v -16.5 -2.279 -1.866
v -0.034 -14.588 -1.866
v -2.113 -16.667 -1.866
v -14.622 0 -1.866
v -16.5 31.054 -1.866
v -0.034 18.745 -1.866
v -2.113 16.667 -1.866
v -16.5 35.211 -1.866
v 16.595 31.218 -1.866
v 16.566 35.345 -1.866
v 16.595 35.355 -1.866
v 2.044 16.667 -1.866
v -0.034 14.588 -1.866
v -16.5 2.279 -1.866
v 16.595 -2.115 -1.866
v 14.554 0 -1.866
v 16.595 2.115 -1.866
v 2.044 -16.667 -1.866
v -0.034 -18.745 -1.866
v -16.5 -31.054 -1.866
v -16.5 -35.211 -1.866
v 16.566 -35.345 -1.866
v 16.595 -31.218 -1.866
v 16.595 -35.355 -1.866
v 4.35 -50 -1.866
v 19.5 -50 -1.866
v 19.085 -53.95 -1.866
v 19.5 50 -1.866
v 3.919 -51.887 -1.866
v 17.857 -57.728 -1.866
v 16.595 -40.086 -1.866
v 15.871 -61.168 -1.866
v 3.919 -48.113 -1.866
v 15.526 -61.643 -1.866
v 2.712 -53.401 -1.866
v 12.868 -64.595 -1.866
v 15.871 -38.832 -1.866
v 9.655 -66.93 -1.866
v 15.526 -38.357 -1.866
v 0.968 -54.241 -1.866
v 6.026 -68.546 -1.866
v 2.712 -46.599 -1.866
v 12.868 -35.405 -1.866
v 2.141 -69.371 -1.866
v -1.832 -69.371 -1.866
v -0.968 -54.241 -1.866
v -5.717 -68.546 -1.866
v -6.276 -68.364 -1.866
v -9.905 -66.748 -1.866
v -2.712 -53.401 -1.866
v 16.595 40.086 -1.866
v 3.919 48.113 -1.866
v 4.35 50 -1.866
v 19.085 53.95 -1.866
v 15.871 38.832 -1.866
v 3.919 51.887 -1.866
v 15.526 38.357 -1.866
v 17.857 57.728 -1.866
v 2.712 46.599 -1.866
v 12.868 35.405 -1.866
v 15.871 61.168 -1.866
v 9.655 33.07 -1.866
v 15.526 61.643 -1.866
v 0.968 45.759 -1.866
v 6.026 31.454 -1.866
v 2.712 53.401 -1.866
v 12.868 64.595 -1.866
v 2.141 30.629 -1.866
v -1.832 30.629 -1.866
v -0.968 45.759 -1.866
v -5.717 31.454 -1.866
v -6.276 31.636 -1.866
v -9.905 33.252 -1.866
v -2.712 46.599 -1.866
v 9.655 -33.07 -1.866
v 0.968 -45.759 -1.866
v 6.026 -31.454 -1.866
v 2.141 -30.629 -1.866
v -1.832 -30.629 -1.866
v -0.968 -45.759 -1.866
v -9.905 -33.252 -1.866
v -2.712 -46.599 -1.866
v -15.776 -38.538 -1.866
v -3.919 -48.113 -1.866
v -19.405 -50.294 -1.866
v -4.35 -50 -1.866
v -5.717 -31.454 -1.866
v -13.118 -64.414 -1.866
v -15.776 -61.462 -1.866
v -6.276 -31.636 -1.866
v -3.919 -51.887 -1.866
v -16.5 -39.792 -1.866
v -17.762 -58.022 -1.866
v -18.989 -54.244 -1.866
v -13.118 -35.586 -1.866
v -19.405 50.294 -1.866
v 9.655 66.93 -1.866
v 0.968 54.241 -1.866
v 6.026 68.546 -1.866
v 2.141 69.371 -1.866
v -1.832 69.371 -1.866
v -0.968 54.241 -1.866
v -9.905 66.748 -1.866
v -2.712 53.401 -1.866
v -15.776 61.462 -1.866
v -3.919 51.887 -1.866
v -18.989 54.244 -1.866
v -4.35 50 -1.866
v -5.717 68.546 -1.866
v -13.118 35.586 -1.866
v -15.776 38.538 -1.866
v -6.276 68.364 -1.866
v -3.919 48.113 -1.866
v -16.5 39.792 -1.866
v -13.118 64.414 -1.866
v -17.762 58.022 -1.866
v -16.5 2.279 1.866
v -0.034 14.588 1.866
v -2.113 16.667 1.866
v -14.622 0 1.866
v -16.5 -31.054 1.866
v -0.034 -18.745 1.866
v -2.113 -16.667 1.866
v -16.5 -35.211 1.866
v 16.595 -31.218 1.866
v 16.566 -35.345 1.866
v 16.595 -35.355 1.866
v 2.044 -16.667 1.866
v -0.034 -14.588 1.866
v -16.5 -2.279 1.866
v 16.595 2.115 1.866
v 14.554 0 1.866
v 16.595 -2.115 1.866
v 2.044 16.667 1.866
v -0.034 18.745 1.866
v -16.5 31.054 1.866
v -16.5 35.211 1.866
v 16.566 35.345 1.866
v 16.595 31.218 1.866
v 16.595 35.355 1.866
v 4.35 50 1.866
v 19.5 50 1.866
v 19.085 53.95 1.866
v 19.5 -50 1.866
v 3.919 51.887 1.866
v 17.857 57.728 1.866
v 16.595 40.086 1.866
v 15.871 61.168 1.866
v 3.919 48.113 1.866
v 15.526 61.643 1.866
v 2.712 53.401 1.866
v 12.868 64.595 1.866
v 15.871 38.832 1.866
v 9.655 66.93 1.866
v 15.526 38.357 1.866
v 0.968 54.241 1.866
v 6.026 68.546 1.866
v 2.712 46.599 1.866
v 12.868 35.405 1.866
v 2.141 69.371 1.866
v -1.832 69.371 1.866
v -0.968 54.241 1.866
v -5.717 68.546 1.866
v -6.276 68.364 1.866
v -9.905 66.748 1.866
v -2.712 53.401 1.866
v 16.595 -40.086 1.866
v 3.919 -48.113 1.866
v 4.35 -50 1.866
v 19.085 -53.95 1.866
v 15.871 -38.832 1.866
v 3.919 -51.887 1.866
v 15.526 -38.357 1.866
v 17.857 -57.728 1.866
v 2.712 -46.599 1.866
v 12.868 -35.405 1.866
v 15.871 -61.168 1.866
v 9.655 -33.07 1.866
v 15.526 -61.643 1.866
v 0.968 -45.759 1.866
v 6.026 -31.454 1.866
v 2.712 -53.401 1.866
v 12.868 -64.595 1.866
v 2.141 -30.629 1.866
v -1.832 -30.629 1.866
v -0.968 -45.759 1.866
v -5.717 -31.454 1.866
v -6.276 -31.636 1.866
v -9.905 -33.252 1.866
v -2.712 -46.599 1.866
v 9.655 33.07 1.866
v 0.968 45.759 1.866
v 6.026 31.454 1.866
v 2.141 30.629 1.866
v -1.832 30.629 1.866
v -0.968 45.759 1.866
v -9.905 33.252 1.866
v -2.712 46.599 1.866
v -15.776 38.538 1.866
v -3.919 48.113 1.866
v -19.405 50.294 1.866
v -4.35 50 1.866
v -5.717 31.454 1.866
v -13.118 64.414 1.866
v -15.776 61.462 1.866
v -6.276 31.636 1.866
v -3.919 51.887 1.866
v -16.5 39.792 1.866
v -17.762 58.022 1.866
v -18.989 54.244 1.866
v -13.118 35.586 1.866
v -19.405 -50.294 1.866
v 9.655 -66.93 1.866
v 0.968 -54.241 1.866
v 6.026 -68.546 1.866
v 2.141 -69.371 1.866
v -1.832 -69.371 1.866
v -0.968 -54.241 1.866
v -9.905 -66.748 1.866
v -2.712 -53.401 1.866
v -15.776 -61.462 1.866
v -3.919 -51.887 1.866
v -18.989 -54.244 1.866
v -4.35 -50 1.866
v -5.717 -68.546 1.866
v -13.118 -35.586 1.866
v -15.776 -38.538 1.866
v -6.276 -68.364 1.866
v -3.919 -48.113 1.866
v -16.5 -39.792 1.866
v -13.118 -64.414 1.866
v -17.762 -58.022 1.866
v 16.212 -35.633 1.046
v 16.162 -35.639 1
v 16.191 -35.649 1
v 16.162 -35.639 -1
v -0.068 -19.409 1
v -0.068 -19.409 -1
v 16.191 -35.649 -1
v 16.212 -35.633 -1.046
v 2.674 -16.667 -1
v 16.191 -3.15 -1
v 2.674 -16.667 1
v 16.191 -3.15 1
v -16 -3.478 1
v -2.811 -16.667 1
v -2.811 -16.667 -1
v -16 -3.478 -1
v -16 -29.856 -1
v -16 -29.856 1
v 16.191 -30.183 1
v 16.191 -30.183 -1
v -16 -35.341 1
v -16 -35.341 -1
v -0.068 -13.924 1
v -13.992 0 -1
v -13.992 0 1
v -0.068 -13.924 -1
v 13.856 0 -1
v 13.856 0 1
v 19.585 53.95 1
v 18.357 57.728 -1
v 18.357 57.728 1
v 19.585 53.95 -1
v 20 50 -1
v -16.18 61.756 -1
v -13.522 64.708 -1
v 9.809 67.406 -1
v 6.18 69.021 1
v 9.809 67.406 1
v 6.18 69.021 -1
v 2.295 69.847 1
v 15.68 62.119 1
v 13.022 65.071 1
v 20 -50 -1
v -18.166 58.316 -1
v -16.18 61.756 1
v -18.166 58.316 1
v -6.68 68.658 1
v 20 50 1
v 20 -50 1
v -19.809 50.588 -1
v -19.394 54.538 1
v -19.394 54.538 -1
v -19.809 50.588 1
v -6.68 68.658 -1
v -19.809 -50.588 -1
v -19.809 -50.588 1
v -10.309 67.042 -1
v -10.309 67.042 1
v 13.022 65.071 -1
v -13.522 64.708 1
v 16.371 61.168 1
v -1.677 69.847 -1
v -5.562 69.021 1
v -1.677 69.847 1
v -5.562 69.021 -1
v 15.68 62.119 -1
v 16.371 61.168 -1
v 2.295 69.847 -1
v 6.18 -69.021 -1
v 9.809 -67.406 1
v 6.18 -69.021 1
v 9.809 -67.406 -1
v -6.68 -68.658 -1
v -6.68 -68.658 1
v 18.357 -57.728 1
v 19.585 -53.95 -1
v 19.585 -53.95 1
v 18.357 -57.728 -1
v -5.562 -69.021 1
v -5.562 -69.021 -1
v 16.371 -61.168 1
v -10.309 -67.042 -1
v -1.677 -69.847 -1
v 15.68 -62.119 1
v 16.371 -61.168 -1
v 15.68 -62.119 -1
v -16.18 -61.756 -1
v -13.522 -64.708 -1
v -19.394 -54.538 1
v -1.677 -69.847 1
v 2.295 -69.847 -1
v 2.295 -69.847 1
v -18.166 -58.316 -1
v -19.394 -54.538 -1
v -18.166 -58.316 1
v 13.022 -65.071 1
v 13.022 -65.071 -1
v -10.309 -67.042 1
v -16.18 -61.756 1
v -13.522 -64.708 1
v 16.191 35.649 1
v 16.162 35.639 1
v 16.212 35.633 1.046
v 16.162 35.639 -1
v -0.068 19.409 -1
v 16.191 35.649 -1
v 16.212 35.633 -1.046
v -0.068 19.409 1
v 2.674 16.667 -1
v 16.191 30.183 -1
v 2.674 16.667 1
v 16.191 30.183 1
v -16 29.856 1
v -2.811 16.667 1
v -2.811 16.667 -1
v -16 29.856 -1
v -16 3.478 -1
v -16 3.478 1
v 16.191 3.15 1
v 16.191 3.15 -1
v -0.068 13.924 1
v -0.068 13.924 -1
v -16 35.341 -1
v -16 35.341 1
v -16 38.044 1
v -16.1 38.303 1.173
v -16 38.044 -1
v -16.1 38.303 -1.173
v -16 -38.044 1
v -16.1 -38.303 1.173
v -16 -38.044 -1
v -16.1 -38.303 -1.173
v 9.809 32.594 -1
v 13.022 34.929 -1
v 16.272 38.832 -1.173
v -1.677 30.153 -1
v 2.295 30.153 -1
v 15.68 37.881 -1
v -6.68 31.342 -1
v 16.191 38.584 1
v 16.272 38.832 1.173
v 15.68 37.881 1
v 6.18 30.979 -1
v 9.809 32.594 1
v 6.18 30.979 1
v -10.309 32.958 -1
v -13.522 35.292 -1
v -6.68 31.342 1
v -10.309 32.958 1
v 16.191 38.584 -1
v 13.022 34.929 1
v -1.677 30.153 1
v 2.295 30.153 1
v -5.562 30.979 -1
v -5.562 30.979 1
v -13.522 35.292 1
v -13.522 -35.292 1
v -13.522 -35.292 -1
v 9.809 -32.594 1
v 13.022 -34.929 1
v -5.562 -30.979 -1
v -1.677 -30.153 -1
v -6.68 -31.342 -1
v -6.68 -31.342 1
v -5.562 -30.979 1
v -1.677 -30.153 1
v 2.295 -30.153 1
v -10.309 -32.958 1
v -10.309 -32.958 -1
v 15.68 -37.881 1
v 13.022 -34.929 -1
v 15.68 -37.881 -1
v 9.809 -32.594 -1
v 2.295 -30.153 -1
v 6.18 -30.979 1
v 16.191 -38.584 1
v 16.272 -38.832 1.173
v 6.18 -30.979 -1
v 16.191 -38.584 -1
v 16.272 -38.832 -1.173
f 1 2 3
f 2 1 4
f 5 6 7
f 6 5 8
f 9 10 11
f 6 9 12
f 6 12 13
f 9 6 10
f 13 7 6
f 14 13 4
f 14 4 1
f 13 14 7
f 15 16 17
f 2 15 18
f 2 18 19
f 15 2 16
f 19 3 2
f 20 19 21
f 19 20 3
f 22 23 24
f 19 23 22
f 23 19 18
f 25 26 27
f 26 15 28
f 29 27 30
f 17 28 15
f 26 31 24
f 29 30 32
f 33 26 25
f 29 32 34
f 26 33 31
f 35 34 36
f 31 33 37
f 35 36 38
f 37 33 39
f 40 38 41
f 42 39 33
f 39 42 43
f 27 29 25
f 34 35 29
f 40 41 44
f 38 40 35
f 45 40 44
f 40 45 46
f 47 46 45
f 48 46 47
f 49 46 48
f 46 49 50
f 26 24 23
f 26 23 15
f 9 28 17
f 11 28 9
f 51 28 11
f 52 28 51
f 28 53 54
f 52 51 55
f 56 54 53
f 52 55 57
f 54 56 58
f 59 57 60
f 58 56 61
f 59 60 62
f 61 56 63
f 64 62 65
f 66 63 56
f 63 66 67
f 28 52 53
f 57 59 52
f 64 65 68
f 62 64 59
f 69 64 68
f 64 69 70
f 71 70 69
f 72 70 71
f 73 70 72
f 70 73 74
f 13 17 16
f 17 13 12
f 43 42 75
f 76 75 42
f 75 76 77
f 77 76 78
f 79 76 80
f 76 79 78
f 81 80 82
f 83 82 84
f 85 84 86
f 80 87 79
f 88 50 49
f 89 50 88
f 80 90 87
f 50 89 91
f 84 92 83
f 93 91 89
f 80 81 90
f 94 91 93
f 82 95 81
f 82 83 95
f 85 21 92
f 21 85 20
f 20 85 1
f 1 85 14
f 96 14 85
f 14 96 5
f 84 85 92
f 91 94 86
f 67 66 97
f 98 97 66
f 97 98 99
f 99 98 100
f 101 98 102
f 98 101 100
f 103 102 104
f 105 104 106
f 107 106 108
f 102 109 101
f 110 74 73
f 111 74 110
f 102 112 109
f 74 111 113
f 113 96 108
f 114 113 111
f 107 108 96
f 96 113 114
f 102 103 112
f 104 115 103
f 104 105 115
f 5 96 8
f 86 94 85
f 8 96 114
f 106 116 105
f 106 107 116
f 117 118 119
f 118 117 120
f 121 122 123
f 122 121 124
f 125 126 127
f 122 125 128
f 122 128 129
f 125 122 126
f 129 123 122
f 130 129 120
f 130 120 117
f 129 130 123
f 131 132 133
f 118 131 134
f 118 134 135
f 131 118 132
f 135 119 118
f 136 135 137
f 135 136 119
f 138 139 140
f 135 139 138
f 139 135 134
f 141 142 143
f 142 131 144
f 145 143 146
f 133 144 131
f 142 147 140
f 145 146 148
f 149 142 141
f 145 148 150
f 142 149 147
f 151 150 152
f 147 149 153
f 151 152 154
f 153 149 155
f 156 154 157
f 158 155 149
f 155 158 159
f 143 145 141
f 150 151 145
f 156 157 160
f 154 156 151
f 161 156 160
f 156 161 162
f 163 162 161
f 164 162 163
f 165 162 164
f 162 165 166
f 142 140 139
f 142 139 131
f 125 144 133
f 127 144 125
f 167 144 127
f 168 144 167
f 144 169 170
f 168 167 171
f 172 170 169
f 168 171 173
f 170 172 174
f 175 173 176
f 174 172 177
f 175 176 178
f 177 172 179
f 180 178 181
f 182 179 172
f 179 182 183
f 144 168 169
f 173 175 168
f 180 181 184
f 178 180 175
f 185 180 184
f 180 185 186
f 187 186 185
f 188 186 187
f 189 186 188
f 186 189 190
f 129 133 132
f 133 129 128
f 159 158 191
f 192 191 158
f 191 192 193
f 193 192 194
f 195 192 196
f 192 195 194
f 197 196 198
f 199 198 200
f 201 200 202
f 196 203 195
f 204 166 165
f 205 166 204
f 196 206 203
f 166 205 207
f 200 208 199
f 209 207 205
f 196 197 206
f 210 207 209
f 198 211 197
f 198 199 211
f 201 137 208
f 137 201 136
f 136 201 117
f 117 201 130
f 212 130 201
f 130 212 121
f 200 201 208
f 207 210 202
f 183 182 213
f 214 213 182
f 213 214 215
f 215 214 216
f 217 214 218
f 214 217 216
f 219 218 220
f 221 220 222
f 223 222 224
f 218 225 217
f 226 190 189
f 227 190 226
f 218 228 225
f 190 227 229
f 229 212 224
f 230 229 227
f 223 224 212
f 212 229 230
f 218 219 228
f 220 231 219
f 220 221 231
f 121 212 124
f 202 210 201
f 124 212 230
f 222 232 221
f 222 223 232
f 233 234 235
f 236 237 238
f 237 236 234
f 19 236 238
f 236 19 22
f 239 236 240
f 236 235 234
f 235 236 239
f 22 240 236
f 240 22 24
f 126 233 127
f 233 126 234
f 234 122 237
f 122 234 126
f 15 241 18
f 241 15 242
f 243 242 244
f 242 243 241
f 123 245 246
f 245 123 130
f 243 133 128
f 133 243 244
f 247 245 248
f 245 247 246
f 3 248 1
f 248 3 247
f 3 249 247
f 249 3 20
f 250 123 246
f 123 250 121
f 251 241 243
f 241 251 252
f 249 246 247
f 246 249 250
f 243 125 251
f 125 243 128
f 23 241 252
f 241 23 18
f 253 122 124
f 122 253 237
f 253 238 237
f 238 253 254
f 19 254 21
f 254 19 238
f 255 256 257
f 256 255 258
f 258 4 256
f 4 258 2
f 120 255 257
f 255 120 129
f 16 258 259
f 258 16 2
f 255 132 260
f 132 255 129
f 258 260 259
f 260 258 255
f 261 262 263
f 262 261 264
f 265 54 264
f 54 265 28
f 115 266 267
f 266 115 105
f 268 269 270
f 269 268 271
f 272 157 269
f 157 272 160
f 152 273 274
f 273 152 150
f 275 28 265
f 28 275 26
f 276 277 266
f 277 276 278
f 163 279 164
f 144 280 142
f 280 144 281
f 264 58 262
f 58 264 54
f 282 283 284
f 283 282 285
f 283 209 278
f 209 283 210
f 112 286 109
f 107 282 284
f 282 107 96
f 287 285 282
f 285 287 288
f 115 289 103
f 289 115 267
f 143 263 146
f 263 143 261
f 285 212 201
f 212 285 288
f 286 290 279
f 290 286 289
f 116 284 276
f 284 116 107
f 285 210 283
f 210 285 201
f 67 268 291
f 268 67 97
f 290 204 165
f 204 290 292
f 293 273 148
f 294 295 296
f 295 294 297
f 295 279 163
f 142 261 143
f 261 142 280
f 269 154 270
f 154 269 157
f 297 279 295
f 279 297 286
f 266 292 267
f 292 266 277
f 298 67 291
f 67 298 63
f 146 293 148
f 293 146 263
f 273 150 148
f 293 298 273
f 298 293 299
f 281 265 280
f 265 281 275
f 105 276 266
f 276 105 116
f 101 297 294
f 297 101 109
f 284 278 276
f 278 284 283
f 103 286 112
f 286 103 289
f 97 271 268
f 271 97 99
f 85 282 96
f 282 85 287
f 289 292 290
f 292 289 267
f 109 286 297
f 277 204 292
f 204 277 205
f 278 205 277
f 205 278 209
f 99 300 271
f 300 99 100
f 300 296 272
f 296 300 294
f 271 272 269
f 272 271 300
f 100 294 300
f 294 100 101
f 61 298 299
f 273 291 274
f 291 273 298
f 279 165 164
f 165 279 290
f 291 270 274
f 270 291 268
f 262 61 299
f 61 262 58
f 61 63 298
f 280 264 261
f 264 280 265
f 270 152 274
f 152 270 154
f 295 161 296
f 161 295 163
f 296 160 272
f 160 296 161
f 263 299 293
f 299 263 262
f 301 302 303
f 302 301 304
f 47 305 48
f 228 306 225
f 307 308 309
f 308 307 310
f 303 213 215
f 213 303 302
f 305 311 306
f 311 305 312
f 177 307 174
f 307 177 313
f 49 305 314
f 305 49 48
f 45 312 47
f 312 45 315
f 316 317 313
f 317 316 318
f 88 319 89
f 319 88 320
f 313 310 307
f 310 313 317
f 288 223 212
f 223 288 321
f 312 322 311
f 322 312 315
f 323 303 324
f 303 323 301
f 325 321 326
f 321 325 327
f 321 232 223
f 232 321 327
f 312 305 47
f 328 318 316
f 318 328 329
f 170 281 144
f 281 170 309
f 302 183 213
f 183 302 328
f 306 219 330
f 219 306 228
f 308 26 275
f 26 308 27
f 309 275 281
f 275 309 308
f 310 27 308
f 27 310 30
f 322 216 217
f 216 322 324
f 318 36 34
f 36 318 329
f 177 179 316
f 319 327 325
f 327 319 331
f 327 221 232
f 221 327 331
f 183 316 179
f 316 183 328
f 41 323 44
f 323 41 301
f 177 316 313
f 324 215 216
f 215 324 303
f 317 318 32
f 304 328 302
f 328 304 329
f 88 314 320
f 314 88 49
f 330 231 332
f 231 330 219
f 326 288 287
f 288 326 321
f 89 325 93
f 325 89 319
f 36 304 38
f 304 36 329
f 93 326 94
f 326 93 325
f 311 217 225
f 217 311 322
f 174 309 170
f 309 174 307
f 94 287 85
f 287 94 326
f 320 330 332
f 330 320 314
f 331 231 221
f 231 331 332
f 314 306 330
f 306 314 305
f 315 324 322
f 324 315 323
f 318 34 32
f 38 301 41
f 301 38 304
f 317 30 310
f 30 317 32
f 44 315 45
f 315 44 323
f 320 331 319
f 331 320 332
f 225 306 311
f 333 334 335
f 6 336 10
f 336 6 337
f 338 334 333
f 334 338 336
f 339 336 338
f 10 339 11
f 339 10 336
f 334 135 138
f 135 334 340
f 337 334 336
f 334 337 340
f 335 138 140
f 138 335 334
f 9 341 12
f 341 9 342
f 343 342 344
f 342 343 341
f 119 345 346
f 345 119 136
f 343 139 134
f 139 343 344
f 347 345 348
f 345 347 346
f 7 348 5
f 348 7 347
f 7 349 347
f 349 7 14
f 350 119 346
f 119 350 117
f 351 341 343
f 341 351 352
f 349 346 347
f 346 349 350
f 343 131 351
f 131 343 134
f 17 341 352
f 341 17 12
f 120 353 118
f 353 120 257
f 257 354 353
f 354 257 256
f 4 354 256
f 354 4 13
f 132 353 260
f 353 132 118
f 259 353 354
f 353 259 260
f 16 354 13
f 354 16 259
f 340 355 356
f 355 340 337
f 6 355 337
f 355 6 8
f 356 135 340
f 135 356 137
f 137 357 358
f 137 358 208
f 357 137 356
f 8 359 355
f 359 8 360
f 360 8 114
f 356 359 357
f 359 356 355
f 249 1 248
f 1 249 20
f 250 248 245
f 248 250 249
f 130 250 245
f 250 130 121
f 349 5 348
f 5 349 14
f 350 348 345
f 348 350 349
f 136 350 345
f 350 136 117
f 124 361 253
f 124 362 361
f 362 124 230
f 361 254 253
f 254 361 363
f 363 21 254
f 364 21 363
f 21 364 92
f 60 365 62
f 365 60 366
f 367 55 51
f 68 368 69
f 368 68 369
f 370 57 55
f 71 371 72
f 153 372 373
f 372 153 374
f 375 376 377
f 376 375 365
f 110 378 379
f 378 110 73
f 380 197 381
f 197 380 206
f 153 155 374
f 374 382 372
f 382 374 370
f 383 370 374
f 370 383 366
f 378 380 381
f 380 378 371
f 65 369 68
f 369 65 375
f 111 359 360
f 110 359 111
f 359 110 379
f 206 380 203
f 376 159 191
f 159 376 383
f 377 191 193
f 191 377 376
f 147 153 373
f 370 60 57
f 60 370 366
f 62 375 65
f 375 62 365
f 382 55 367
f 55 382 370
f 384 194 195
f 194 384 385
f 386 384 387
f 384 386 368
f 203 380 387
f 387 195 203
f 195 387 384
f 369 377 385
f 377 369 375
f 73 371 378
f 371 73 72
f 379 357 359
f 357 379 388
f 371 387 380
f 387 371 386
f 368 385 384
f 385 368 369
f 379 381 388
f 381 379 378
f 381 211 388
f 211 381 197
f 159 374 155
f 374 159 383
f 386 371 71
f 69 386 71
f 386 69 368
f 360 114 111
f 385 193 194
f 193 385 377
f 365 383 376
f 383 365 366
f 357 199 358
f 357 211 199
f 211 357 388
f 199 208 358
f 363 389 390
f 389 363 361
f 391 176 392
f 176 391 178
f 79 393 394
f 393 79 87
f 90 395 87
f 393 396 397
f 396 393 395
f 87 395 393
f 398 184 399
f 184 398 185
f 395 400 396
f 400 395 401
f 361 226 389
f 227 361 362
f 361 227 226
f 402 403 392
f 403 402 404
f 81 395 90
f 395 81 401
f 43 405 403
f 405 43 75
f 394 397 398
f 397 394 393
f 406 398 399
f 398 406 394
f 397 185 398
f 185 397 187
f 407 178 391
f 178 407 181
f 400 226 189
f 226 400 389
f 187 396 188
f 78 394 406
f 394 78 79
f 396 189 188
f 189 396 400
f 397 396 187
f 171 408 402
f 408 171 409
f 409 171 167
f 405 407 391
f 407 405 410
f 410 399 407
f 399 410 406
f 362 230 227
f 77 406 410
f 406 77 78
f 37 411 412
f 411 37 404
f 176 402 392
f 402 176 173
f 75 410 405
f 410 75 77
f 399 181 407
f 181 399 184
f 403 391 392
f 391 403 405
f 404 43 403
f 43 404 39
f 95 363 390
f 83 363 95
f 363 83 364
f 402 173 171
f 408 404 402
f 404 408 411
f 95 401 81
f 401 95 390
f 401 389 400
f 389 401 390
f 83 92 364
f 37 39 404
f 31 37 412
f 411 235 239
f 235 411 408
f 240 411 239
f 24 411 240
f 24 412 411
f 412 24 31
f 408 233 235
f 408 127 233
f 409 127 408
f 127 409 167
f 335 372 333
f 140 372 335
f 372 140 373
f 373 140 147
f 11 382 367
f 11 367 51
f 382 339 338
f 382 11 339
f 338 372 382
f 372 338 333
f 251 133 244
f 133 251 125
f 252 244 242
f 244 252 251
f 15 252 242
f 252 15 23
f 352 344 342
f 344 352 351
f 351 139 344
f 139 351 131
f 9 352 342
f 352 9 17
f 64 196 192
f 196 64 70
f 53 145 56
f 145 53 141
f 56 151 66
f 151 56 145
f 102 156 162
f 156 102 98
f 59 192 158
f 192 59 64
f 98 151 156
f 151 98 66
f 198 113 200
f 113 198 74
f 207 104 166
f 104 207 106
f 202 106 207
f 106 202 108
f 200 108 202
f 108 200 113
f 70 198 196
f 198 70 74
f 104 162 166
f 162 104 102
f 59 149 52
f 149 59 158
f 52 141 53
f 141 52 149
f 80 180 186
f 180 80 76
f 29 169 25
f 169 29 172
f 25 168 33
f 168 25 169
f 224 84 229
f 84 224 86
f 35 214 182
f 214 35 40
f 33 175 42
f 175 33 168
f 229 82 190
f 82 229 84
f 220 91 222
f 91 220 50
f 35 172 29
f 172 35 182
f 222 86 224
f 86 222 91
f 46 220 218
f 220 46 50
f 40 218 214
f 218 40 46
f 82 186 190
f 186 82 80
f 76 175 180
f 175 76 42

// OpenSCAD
//$fn=30;

seperation = 50; 
size = 38;
heigth = 2;

//#translate([100,-100,-10]) import("/home/jklein/objects/Spool_Stand_with_6000RS_bearings/Spool_Stand_Inner.stl");

difference(){
	outsideStand();
	shaftCutout();
}

module shaftCutout(){
	size = 8.7;
	heigth = 10;
	translate([0,seperation,0])
		cylinder(h=heigth,d=size,center=true);  
	mirror([0,seperation,0])	
		translate([0,seperation,0])
			cylinder(h=heigth,d=size,center=true);
}

module insideStand(){
	minkowski() {
		union(){
			base();
			insideBars();
			difference(){
				union(){
					translate([0,seperation/3,0]) crossBars();
					translate([0,-seperation/3,0]) crossBars();
				}
				translate([-((size+heigth)/1.7),0,0])
					cube([size,seperation*2,heigth+2],center=true);
			}
		}
		sphere(1);
	}	
}
	
module outsideStand(){
	minkowski() {
		union(){
			base();
			outsideBars();
			translate([0,seperation/3,0]) crossBars();
			translate([0,-seperation/3,0]) crossBars();
		}
		sphere(1);
	}	
}	
	
module crossBars(){
	rotate([0,0,45])
		cube([heigth,seperation,heigth],center=true);
	rotate([0,0,-45])
		cube([heigth,seperation,heigth],center=true);
}

module outsideBars(){
	translate([-((size-heigth)/2),0,0])
		cube([heigth,seperation*2,heigth],center=true);

}

module insideBars(){
	translate([-((size-heigth)/8),0,0])
		cube([heigth,seperation*2,heigth],center=true);

}

module base(){
	translate([0,seperation,0])
		cylinder(h=heigth,d=size,center=true);  
	mirror([0,seperation,0])	
		translate([0,seperation,0])
			cylinder(h=heigth,d=size,center=true);
	translate([((size-heigth)/2),0,0])
		cube([heigth,seperation*2,heigth],center=true);

}
